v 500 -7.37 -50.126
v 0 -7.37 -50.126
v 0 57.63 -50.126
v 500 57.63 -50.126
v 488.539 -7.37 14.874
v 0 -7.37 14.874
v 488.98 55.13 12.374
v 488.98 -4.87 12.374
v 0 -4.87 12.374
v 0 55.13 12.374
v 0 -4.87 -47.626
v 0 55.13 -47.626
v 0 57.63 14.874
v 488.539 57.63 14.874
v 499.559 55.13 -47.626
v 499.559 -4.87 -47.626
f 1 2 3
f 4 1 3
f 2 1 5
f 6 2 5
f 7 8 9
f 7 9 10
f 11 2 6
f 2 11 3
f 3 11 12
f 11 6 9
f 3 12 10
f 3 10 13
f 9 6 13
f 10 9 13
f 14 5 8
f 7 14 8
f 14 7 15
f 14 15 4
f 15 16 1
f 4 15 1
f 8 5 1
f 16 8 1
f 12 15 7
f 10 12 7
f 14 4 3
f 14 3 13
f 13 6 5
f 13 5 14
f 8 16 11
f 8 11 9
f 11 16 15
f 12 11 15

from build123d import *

# Parameters (mm, degrees)
F0_W     = 65
F0_H     = 65
F1_DEPTH = 500
F2_W     = 60
F2_H     = 60
F3_DEPTH = 500
F5_DEPTH = 70


with BuildPart() as f1:
    # F0 (on Right) → F1 (new body)
    with BuildSketch(Plane.YZ):
        with Locations((25.129514, -17.626217)):
            Rectangle(F0_W, F0_H)
    extrude(amount=F1_DEPTH)

    # F2 (on face) → F3 (cut)
    with BuildSketch(Plane.YZ.offset(500)):
        with Locations((25.129514, -17.626217)):
            Rectangle(F2_W, F2_H)
    extrude(amount=-F3_DEPTH, mode=Mode.SUBTRACT)

    # F4 (on face) → F5 (cut)
    with BuildSketch(Plane.XZ.offset(7.370486)):
        Polygon((488.538746, 14.873783), (500, -50.126217), (500, 14.873783), align=None)
    extrude(amount=-F5_DEPTH, mode=Mode.SUBTRACT)


solid = f1.part
